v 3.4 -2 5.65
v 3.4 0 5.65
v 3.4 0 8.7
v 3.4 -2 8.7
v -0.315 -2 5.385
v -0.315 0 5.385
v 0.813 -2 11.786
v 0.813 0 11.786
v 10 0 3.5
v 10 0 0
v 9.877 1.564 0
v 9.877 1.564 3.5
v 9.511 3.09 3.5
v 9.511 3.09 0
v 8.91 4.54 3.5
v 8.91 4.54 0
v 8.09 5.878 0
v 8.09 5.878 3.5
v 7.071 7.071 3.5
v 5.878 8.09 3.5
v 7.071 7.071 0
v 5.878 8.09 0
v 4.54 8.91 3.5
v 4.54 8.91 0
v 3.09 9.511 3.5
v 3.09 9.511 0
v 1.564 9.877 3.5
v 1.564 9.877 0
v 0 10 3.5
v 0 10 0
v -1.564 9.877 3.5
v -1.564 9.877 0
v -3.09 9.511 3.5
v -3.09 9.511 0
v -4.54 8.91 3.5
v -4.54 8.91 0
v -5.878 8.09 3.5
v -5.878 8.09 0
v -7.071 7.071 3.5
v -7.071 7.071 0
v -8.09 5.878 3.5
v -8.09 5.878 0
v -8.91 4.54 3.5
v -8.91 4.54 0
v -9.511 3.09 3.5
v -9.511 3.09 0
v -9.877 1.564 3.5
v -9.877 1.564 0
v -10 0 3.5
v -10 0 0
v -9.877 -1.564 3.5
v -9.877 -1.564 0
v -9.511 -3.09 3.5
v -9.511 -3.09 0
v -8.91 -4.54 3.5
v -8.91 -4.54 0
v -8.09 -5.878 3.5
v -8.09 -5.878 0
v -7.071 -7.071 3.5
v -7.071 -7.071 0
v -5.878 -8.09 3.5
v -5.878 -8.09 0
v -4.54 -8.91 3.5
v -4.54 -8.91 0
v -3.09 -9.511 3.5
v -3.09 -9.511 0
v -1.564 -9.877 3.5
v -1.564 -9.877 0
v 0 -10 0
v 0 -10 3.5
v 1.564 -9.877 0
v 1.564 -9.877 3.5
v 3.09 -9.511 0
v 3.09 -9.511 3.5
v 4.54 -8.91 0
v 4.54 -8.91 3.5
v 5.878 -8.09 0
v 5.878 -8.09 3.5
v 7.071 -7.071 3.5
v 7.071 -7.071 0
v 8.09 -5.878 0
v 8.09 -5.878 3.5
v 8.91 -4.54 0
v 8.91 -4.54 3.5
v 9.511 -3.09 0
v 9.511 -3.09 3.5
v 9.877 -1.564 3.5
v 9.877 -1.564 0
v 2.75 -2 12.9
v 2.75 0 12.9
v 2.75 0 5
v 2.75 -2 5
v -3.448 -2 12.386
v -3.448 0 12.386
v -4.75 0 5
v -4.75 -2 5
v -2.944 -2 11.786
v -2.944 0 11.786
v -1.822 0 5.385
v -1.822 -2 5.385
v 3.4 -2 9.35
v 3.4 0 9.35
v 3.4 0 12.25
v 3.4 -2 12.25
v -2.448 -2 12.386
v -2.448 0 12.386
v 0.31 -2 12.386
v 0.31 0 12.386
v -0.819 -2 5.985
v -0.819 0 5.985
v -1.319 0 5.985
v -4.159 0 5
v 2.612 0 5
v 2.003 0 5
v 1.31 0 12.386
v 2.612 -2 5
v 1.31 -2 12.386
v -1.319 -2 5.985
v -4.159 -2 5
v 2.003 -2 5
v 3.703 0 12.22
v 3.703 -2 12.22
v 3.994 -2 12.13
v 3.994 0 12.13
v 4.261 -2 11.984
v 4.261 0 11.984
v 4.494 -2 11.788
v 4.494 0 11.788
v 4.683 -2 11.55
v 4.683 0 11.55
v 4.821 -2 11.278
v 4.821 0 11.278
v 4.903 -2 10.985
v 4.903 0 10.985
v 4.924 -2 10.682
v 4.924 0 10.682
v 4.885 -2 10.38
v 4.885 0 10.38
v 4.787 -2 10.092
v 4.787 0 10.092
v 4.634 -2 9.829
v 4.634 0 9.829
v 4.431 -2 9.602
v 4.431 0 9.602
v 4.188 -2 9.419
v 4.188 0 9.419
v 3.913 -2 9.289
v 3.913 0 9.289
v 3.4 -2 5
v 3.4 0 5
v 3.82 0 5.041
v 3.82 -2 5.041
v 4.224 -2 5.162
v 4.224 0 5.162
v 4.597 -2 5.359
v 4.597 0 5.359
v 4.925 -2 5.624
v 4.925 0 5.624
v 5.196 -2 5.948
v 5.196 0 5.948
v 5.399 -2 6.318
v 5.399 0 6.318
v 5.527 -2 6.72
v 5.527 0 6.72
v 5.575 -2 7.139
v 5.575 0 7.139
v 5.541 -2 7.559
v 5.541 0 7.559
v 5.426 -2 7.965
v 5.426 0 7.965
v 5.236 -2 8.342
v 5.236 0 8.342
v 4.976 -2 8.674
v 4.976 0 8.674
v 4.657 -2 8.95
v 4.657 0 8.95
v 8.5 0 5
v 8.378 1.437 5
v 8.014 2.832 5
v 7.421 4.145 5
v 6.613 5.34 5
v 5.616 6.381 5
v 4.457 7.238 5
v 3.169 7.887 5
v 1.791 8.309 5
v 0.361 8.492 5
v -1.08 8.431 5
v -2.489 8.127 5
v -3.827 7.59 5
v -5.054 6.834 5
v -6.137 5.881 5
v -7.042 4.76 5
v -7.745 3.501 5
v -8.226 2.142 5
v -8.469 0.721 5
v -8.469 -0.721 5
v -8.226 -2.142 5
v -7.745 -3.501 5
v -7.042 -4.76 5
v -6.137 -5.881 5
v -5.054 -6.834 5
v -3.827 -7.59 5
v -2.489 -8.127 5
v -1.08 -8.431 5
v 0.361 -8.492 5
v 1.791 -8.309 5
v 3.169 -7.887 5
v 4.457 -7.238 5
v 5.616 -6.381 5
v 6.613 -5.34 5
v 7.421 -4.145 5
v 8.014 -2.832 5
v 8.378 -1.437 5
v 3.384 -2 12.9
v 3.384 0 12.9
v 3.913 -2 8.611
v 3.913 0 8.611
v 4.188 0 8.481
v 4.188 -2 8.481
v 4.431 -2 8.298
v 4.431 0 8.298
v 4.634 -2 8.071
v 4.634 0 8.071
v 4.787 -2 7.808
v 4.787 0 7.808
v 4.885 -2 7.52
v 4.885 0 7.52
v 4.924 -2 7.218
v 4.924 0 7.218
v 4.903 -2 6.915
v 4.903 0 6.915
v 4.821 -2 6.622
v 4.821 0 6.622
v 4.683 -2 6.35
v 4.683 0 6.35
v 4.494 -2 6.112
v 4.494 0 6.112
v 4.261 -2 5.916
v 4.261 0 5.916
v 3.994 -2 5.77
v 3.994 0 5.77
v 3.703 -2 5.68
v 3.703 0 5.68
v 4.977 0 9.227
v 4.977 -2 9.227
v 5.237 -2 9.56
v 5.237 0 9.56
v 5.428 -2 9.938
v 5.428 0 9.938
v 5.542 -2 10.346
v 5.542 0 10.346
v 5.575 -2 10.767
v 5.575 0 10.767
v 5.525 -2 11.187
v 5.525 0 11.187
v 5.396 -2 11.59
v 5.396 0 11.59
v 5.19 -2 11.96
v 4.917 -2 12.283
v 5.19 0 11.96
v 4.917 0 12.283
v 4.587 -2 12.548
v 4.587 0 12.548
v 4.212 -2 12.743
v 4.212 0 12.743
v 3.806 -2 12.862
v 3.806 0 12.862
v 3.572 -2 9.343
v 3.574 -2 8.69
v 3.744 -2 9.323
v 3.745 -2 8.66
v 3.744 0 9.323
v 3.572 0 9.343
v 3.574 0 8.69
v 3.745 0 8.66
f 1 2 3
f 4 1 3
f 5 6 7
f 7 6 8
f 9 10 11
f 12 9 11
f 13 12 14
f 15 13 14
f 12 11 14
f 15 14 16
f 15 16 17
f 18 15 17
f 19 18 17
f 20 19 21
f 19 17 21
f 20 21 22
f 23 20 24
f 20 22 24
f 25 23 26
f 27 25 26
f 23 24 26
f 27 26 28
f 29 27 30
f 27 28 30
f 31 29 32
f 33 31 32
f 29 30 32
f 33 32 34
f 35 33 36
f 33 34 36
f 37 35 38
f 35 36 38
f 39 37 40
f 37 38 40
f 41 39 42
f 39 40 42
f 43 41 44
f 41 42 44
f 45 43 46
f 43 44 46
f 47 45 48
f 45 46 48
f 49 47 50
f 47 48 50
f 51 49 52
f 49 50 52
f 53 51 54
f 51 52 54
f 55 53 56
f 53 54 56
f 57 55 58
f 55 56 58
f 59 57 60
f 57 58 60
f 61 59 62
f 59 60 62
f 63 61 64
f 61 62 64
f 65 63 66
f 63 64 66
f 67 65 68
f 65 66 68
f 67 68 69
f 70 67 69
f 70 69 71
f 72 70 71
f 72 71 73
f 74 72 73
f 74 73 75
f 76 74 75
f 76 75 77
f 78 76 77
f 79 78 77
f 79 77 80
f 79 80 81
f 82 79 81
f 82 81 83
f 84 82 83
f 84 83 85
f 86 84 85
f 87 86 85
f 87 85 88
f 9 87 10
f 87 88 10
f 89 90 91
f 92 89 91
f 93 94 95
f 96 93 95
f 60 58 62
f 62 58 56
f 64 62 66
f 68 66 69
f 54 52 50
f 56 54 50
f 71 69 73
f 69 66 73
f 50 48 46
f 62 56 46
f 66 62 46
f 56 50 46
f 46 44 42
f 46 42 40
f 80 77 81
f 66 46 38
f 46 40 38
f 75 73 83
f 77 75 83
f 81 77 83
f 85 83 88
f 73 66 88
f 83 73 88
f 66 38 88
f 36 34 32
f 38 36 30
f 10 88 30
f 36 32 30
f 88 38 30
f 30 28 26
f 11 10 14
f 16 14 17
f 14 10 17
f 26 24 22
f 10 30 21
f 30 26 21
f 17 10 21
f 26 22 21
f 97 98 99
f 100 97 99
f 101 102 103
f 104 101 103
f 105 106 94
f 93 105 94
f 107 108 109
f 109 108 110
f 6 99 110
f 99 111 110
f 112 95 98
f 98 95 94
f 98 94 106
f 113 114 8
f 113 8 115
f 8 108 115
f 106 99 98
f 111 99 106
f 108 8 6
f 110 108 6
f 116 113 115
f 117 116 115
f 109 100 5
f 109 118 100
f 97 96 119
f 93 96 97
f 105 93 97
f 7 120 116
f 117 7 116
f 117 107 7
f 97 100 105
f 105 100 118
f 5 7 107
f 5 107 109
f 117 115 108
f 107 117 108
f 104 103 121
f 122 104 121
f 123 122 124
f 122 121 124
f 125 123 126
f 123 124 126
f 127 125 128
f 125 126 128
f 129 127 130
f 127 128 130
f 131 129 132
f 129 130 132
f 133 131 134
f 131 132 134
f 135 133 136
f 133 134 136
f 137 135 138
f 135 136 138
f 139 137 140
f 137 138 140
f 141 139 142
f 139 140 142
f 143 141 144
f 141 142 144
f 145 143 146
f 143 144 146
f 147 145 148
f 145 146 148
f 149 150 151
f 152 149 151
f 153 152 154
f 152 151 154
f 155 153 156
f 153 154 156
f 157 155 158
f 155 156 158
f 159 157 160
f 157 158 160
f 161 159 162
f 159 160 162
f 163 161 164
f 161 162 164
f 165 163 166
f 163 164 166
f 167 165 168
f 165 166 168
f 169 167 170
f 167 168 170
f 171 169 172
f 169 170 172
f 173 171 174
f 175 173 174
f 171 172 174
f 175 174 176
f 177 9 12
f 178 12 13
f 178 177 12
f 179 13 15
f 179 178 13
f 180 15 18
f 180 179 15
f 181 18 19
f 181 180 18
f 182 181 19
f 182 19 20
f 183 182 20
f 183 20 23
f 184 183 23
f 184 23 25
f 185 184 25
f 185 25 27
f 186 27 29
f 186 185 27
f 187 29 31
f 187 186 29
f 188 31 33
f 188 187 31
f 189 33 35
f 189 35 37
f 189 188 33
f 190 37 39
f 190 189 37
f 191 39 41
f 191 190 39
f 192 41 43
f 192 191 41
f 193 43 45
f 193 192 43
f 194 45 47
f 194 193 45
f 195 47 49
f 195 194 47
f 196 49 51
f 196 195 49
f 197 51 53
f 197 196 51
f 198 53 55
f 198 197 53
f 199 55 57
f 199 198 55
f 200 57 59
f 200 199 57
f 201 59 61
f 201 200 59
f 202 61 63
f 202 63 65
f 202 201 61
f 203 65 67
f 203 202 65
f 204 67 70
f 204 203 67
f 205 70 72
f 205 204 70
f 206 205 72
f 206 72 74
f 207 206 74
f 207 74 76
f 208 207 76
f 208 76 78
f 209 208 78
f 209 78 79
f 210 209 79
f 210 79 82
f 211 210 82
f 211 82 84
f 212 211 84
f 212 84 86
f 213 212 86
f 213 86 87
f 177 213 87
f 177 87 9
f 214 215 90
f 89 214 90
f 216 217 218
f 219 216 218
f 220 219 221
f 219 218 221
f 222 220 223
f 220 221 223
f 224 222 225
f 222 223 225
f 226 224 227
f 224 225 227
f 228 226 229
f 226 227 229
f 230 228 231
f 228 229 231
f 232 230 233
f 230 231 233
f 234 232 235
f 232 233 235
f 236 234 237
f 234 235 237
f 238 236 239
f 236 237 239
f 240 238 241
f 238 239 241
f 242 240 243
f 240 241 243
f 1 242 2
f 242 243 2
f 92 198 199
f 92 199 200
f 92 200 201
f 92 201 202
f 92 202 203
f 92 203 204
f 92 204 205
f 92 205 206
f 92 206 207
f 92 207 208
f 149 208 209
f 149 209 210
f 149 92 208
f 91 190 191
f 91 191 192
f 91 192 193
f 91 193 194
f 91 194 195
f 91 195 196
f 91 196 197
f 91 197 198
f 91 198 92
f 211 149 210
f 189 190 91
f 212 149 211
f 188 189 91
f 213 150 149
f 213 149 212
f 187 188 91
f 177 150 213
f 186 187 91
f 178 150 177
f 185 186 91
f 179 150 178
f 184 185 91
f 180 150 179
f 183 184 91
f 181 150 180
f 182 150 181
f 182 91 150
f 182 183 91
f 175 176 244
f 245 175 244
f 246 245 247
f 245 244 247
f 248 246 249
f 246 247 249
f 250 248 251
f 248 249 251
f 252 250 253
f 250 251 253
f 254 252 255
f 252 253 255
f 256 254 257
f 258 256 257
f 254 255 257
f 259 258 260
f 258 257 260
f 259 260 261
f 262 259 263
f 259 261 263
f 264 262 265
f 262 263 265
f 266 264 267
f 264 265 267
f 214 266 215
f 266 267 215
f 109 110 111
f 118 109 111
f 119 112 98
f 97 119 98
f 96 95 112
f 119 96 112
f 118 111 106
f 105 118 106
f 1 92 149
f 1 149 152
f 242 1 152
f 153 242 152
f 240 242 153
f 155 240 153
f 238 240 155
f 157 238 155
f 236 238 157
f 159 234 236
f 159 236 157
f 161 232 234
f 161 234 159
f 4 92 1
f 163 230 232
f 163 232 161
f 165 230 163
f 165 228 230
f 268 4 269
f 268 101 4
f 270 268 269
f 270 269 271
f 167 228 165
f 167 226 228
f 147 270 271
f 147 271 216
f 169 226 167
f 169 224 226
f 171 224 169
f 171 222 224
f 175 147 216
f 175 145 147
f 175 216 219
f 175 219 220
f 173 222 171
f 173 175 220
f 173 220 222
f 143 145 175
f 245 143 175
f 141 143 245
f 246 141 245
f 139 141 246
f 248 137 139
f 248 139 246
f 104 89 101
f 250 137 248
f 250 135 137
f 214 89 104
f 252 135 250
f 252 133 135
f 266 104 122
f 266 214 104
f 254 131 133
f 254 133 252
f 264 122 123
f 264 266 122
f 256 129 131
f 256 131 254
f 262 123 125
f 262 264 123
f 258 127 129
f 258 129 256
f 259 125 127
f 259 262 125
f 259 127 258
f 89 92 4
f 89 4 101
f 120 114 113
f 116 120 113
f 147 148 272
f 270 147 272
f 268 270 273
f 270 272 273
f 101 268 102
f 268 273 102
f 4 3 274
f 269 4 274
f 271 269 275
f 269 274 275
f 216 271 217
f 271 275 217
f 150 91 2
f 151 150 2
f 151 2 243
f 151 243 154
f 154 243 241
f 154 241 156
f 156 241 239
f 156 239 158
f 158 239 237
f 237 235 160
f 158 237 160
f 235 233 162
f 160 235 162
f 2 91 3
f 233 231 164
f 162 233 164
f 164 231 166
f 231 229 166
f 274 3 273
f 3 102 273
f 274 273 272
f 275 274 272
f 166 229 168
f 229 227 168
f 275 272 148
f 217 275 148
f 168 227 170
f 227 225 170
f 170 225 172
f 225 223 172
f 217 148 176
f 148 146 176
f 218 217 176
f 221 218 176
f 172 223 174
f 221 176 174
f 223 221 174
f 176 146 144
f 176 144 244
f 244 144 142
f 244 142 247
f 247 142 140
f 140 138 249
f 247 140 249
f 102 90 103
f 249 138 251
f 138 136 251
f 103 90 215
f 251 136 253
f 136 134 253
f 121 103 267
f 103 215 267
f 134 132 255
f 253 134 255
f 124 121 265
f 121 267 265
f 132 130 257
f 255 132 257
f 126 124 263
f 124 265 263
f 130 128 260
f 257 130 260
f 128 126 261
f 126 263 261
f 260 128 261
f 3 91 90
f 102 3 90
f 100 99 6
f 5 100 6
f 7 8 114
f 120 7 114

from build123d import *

# Parameters (mm, degrees)
F0_R     = 10
F1_DEPTH = 5
F2_SIZE  = 1.5
F4_DEPTH = 2
F5_DEPTH = 2


with BuildPart() as f1:
    # F0 (on Top) → F1 (new body)
    with BuildSketch(Plane.XY):
        Circle(F0_R)
    extrude(amount=F1_DEPTH)

    # F2
    f2_edges = [f1.edges().sort_by_distance(p)[0] for p in [
        (-10, 0, 5),
    ]]
    chamfer(f2_edges, length=F2_SIZE)

    # F3 (on Front) → F4 (join)
    with BuildSketch(Plane.XZ):
        with BuildLine():
            ThreePointArc((3.4, 5), (5.4725889607, 6.5154547021), (4.656980509, 8.95))
            ThreePointArc((4.656980509, 8.95), (5.4702175315, 11.3919515516), (3.3844468263, 12.8999443898))
            Line((3.3844468263, 12.8999443898), (2.75, 12.8999443898))
            Line((2.75, 12.8999443898), (2.75, 12.2495439026))
            Line((2.75, 12.2495439026), (2.75, 5.6543101017))
            Line((2.75, 5.6543101017), (2.75, 5))
            Line((2.75, 5), (3.4, 5))
        make_face()
        with BuildLine():
            ThreePointArc((3.9126015656, 8.6112676056), (4.90265317, 6.9148876191), (3.4, 5.65))
            Line((3.4, 5.65), (3.4, 8.55))
            Line((3.4, 8.55), (3.4, 8.7))
            Line((3.4, 8.7), (3.4, 8.95))
            Line((3.4, 8.95), (3.4, 9.2))
            Line((3.4, 9.2), (3.4, 9.35))
            Line((3.4, 9.35), (3.4, 12.25))
            ThreePointArc((3.4, 12.25), (4.90265317, 10.9851123809), (3.9126015656, 9.2887323944))
            ThreePointArc((3.9126015656, 9.2887323944), (4.3008551983, 9.1546678791), (4.656980509, 8.95))
            ThreePointArc((4.656980509, 8.95), (4.3008551983, 8.7453321209), (3.9126015656, 8.6112676056))
        make_face(mode=Mode.SUBTRACT)
        with BuildLine():
            ThreePointArc((3.4, 8.7), (3.6601123809, 8.67765317), (3.9126015656, 8.6112676056))
            ThreePointArc((3.9126015656, 8.6112676056), (4.3008551983, 8.7453321209), (4.656980509, 8.95))
            ThreePointArc((4.656980509, 8.95), (4.3008551983, 9.1546678791), (3.9126015656, 9.2887323944))
            ThreePointArc((3.9126015656, 9.2887323944), (3.6601123809, 9.22234683), (3.4, 9.2))
            Line((3.4, 9.2), (3.4, 8.95))
            Line((3.4, 8.95), (3.4, 8.7))
        make_face()
        with BuildLine():
            ThreePointArc((3.4, 9.2), (3.6601123809, 9.22234683), (3.9126015656, 9.2887323944))
            ThreePointArc((3.9126015656, 9.2887323944), (3.6581250107, 9.3346287827), (3.4, 9.35))
            Line((3.4, 9.35), (3.4, 9.2))
        make_face()
    extrude(amount=F4_DEPTH)


with BuildPart() as f5:
    # F3 (on Front) → F5 (new body)
    with BuildSketch(Plane.XZ):
        Polygon((-3.4476386675, 12.3860581476), (-4.75, 5), (-4.1591153482, 5), (-2.9441788888, 11.7860581476), (-1.8223852914, 5.384807753), (-0.315465734, 5.384807753), (0.8132474209, 11.7860581476), (2.0028930075, 5), (2.6121489747, 5), (1.3097876422, 12.3860581476), (0.3097876422, 12.3860581476), (-0.8189255127, 5.984807753), (-1.3189255127, 5.984807753), (-2.4476386675, 12.3860581476), align=None)
    extrude(amount=F5_DEPTH)


solid = Compound([f1.part, f5.part])
